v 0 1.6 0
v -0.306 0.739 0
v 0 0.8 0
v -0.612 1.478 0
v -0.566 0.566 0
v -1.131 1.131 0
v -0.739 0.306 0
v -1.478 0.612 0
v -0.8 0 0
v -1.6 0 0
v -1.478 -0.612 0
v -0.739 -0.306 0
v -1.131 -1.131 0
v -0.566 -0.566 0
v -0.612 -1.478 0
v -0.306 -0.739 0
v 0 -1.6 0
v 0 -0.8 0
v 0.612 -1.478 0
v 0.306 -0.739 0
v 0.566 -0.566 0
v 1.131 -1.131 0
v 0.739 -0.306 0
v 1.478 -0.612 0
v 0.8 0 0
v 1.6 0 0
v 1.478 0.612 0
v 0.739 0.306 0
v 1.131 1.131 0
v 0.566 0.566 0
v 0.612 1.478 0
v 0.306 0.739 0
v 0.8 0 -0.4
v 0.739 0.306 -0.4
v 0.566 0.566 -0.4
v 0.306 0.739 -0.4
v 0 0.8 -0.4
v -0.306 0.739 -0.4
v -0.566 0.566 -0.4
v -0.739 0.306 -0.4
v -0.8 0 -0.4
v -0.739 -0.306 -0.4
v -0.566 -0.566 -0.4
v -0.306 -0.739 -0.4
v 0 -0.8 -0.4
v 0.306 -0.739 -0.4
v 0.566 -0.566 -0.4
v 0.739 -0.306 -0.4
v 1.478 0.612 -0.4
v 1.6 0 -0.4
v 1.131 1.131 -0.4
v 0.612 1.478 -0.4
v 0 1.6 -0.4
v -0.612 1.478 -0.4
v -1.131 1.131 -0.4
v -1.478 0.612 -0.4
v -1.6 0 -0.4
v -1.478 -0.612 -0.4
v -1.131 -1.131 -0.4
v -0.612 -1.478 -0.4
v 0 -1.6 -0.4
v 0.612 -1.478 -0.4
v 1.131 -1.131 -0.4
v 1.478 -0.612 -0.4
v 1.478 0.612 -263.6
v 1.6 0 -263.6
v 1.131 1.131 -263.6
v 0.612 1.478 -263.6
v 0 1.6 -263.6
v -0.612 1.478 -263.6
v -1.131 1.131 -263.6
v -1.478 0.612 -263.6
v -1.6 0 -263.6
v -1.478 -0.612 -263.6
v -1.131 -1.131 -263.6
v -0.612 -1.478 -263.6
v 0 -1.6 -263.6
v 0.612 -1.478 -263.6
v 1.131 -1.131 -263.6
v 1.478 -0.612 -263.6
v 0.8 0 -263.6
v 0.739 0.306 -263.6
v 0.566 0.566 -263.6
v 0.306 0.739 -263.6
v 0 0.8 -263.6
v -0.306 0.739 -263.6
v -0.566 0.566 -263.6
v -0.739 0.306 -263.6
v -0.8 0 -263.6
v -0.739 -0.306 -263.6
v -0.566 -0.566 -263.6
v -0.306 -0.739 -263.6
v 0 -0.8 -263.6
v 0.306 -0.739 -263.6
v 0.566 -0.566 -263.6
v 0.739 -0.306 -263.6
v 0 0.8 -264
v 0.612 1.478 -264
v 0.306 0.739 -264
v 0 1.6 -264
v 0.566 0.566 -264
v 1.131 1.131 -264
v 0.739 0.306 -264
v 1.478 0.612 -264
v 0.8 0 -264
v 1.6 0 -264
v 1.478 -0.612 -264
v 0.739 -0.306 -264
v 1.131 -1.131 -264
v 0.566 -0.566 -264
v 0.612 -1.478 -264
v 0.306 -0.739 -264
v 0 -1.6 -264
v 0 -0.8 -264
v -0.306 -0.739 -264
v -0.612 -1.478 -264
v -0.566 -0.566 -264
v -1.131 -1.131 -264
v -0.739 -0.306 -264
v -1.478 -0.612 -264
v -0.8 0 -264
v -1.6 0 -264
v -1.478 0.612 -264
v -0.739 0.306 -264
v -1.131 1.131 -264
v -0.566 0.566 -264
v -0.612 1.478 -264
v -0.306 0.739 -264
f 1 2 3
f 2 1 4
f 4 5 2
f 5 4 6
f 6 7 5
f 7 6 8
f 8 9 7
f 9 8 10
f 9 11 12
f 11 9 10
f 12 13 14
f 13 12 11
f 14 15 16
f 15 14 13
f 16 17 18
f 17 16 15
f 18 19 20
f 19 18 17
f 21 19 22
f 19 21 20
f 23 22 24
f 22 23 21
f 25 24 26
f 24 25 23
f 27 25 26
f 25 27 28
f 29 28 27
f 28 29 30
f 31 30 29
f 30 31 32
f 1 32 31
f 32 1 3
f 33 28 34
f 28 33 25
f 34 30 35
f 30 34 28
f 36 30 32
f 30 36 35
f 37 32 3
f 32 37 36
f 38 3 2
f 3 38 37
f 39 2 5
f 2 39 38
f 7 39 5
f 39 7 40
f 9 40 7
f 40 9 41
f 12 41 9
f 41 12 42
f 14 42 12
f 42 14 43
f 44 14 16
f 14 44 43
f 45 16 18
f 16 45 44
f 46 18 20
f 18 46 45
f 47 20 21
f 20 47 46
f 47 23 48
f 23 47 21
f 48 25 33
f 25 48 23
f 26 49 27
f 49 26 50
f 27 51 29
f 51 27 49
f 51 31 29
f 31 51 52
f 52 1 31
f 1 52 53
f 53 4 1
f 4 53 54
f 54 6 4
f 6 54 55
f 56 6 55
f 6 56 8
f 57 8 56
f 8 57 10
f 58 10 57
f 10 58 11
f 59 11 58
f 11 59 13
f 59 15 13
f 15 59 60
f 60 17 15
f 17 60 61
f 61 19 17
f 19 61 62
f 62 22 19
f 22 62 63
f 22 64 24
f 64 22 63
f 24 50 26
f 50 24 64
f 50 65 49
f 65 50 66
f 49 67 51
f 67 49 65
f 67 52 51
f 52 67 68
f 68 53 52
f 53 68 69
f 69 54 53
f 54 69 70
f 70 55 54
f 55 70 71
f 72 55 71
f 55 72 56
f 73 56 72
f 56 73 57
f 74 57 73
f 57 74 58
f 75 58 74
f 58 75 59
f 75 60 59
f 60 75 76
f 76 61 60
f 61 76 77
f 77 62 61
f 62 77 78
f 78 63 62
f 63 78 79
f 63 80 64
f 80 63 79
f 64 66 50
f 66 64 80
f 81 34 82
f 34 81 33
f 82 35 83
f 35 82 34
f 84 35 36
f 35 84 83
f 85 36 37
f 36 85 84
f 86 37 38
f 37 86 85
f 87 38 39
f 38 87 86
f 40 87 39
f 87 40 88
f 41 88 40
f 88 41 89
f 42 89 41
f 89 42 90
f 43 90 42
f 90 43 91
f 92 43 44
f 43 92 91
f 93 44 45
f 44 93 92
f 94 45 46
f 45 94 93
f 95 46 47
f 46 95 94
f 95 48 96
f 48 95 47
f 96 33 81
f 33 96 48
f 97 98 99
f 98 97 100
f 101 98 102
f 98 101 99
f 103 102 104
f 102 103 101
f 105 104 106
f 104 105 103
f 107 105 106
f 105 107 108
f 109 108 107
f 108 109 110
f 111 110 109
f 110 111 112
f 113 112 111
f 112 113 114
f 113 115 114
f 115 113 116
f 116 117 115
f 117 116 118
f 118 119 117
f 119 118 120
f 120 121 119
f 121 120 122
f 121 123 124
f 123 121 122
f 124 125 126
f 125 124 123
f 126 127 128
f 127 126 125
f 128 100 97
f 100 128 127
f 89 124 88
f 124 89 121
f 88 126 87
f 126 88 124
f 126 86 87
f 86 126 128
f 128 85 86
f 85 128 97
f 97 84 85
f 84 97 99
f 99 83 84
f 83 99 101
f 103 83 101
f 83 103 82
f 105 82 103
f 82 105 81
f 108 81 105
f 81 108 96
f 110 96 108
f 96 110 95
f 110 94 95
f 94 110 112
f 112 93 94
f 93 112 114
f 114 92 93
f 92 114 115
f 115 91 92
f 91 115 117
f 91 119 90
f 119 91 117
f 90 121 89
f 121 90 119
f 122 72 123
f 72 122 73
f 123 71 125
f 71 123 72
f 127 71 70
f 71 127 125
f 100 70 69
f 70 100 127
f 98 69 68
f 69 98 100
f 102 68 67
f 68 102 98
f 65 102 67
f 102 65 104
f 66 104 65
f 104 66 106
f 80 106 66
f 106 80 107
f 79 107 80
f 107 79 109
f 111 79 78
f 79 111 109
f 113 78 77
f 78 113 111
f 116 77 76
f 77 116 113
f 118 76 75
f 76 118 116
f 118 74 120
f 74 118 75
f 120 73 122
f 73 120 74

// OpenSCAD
// file: ../p/4-4ring1.scad
use <../lib.scad>
function ldraw_lib__4_4ring1() = [
// 0 Ring  1 x 1.0
// 0 Name: 4-4ring1.dat
// 0 Author: James Jessiman
// 0 !LDRAW_ORG Primitive UPDATE 2009-01
// 0 !LICENSE Licensed under CC BY 2.0 and CC BY 4.0 : see CAreadme.txt
// 
// 0 BFC CERTIFY CCW
  [0,"BFC","CERTIFY"],
  [0,"BFC","CCW"],
// 
// 0 !HISTORY 1998-12-15 [PTadmin] Official Update 1998-10
// 0 !HISTORY 2002-04-08 [BrickCaster] Modified for BFC compliance
// 0 !HISTORY 2002-04-25 [PTadmin] Official Update 2002-02
// 0 !HISTORY 2007-06-24 [PTadmin] Header formatted for Contributor Agreement
// 0 !HISTORY 2008-07-01 [PTadmin] Official Update 2008-01
// 0 !HISTORY 2008-08-26 [cwdee] Switch polygon winding and rename
// 0 !HISTORY 2009-05-02 [PTadmin] Official Update 2009-01
// 
// 
// 4 16 -0.7654 0 1.8478 -0.3827 0 0.9239 0 0 1 0 0 2
  [4,16,-0.7654,0,1.8478,-0.3827,0,0.9239,0,0,1,0,0,2],
// 4 16 -1.4142 0 1.4142 -0.7071 0 0.7071 -0.3827 0 0.9239 -0.7654 0 1.8478
  [4,16,-1.4142,0,1.4142,-0.7071,0,0.7071,-0.3827,0,0.9239,-0.7654,0,1.8478],
// 4 16 -1.8478 0 0.7654 -0.9239 0 0.3827 -0.7071 0 0.7071 -1.4142 0 1.41420
  [4,16,-1.8478,0,0.7654,-0.9239,0,0.3827,-0.7071,0,0.7071,-1.4142,0,1.41420],
// 4 16 -2 0 0 -1 0 0 -0.9239 0 0.3827 -1.8478 0 0.7654
  [4,16,-2,0,0,-1,0,0,-0.9239,0,0.3827,-1.8478,0,0.7654],
// 4 16 -1.8478 0 -0.7654 -0.9239 0 -0.3827 -1 0 0 -2 0 0
  [4,16,-1.8478,0,-0.7654,-0.9239,0,-0.3827,-1,0,0,-2,0,0],
// 4 16 -1.4142 0 -1.4142 -0.7071 0 -0.7071 -0.9239 0 -0.3827 -1.8478 0 -0.7654
  [4,16,-1.4142,0,-1.4142,-0.7071,0,-0.7071,-0.9239,0,-0.3827,-1.8478,0,-0.7654],
// 4 16 -0.7654 0 -1.8478 -0.3827 0 -0.9239 -0.7071 0 -0.7071 -1.4142 0 -1.4142
  [4,16,-0.7654,0,-1.8478,-0.3827,0,-0.9239,-0.7071,0,-0.7071,-1.4142,0,-1.4142],
// 4 16 0 0 -2 0 0 -1 -0.3827 0 -0.9239 -0.7654 0 -1.8478
  [4,16,0,0,-2,0,0,-1,-0.3827,0,-0.9239,-0.7654,0,-1.8478],
// 4 16 0.7654 0 -1.8478 0.3827 0 -0.9239 0 0 -1 0 0 -2
  [4,16,0.7654,0,-1.8478,0.3827,0,-0.9239,0,0,-1,0,0,-2],
// 4 16 1.4142 0 -1.4142 0.7071 0 -0.7071 0.3827 0 -0.9239 0.7654 0 -1.8478
  [4,16,1.4142,0,-1.4142,0.7071,0,-0.7071,0.3827,0,-0.9239,0.7654,0,-1.8478],
// 4 16 1.8478 0 -0.7654 0.9239 0 -0.3827 0.7071 0 -0.7071 1.4142 0 -1.4142
  [4,16,1.8478,0,-0.7654,0.9239,0,-0.3827,0.7071,0,-0.7071,1.4142,0,-1.4142],
// 4 16 2 0 0 1 0 0 0.9239 0 -0.3827 1.8478 0 -0.7654
  [4,16,2,0,0,1,0,0,0.9239,0,-0.3827,1.8478,0,-0.7654],
// 4 16 1.8478 0 0.7654 0.9239 0 0.3827 1 0 0 2 0 0
  [4,16,1.8478,0,0.7654,0.9239,0,0.3827,1,0,0,2,0,0],
// 4 16 1.4142 0 1.4142 0.7071 0 0.7071 0.9239 0 0.3827 1.8478 0 0.7654
  [4,16,1.4142,0,1.4142,0.7071,0,0.7071,0.9239,0,0.3827,1.8478,0,0.7654],
// 4 16 0.7654 0 1.8478 0.3827 0 0.9239 0.7071 0 0.7071 1.4142 0 1.4142
  [4,16,0.7654,0,1.8478,0.3827,0,0.9239,0.7071,0,0.7071,1.4142,0,1.4142],
// 4 16 0 0 2 0 0 1 0.3827 0 0.9239 0.7654 0 1.8478
  [4,16,0,0,2,0,0,1,0.3827,0,0.9239,0.7654,0,1.8478],
// 0
];
module ldraw_lib__4_4ring1(step=0, col=false, unit=2/5, alt=false, line=0.2, solid=!$preview)
    makepoly(ldraw_lib__4_4ring1(), step=step, col=col, unit=unit, alt=alt, line=line, solid=solid);
ldraw_lib__4_4ring1(line=0.2);
// file: ../p/4-4edge.scad
use <../lib.scad>
function ldraw_lib__4_4edge() = [
// 0 Circle 1.0
// 0 Name: 4-4edge.dat
// 0 Author: James Jessiman
// 0 !LDRAW_ORG Primitive UPDATE 2017-01
// 0 !LICENSE Licensed under CC BY 2.0 and CC BY 4.0 : see CAreadme.txt
// 
// 0 BFC CERTIFY CCW
  [0,"BFC","CERTIFY"],
  [0,"BFC","CCW"],
// 
// 0 !HISTORY 1998-12-15 [PTadmin] Official Update 1998-10
// 0 !HISTORY 2005-12-28 [PTadmin] Official Update 2005-01
// 0 !HISTORY 2007-06-24 [PTadmin] Header formatted for Contributor Agreement
// 0 !HISTORY 2008-07-01 [PTadmin] Official Update 2008-01
// 0 !HISTORY 2017-01-15 [Steffen] BFCed
// 0 !HISTORY 2017-12-30 [PTadmin] Official Update 2017-01
// 
// 
// 2 24 1 0 0 0.9239 0 0.3827
  [2,24,1,0,0,0.9239,0,0.3827],
// 2 24 0.9239 0 0.3827 0.7071 0 0.7071
  [2,24,0.9239,0,0.3827,0.7071,0,0.7071],
// 2 24 0.7071 0 0.7071 0.3827 0 0.9239
  [2,24,0.7071,0,0.7071,0.3827,0,0.9239],
// 2 24 0.3827 0 0.9239 0 0 1
  [2,24,0.3827,0,0.9239,0,0,1],
// 2 24 0 0 1 -0.3827 0 0.9239
  [2,24,0,0,1,-0.3827,0,0.9239],
// 2 24 -0.3827 0 0.9239 -0.7071 0 0.7071
  [2,24,-0.3827,0,0.9239,-0.7071,0,0.7071],
// 2 24 -0.7071 0 0.7071 -0.9239 0 0.3827
  [2,24,-0.7071,0,0.7071,-0.9239,0,0.3827],
// 2 24 -0.9239 0 0.3827 -1 0 -0
  [2,24,-0.9239,0,0.3827,-1,0,-0],
// 2 24 -1 0 -0 -0.9239 0 -0.3827
  [2,24,-1,0,-0,-0.9239,0,-0.3827],
// 2 24 -0.9239 0 -0.3827 -0.7071 0 -0.7071
  [2,24,-0.9239,0,-0.3827,-0.7071,0,-0.7071],
// 2 24 -0.7071 0 -0.7071 -0.3827 0 -0.9239
  [2,24,-0.7071,0,-0.7071,-0.3827,0,-0.9239],
// 2 24 -0.3827 0 -0.9239 0 0 -1
  [2,24,-0.3827,0,-0.9239,0,0,-1],
// 2 24 0 0 -1 0.3827 0 -0.9239
  [2,24,0,0,-1,0.3827,0,-0.9239],
// 2 24 0.3827 0 -0.9239 0.7071 0 -0.7071
  [2,24,0.3827,0,-0.9239,0.7071,0,-0.7071],
// 2 24 0.7071 0 -0.7071 0.9239 0 -0.3827
  [2,24,0.7071,0,-0.7071,0.9239,0,-0.3827],
// 2 24 0.9239 0 -0.3827 1 0 0
  [2,24,0.9239,0,-0.3827,1,0,0],
];
module ldraw_lib__4_4edge(step=0, col=false, unit=2/5, alt=false, line=0.2, solid=!$preview)
    makepoly(ldraw_lib__4_4edge(), step=step, col=col, unit=unit, alt=alt, line=line, solid=solid);
ldraw_lib__4_4edge(line=0.2);
// file: ../p/4-4cyli.scad
use <../lib.scad>
function ldraw_lib__4_4cyli() = [
// 0 Cylinder 1.0
// 0 Name: 4-4cyli.dat
// 0 Author: James Jessiman
// 0 !LDRAW_ORG Primitive UPDATE 2005-01
// 0 !LICENSE Licensed under CC BY 2.0 and CC BY 4.0 : see CAreadme.txt
// 
// 0 BFC CERTIFY CCW
  [0,"BFC","CERTIFY"],
  [0,"BFC","CCW"],
// 
// 0 !HISTORY 1998-12-15 [PTadmin] Official Update 1998-10
// 0 !HISTORY 2002-03-23 [sbliss] Added BFC statement; merged headers from files in distributions LDraw 0.27 and Complete.
// 0 !HISTORY 2002-04-25 [PTadmin] Official Update 2002-02
// 0 !HISTORY 2004-12-14 [guyvivan] BFC CCW
// 0 !HISTORY 2005-12-28 [PTadmin] Official Update 2005-01
// 0 !HISTORY 2007-06-24 [PTadmin] Header formatted for Contributor Agreement
// 0 !HISTORY 2008-07-01 [PTadmin] Official Update 2008-01
// 
// 
// 4 16 1 1 0 0.9239 1 0.3827 0.9239 0 0.3827 1 0 0
  [4,16,1,1,0,0.9239,1,0.3827,0.9239,0,0.3827,1,0,0],
// 5 24 1 0 0 1 1 0 0.9239 0 0.3827 0.9239 0 -0.3827
  [5,24,1,0,0,1,1,0,0.9239,0,0.3827,0.9239,0,-0.3827],
// 4 16 0.9239 1 0.3827 0.7071 1 0.7071 0.7071 0 0.7071 0.9239 0 0.3827
  [4,16,0.9239,1,0.3827,0.7071,1,0.7071,0.7071,0,0.7071,0.9239,0,0.3827],
// 5 24 0.9239 0 0.3827 0.9239 1 0.3827 0.7071 0 0.7071 1 0 0
  [5,24,0.9239,0,0.3827,0.9239,1,0.3827,0.7071,0,0.7071,1,0,0],
// 4 16 0.7071 1 0.7071 0.3827 1 0.9239 0.3827 0 0.9239 0.7071 0 0.7071
  [4,16,0.7071,1,0.7071,0.3827,1,0.9239,0.3827,0,0.9239,0.7071,0,0.7071],
// 5 24 0.7071 0 0.7071 0.7071 1 0.7071 0.3827 0 0.9239 0.9239 0 0.3827
  [5,24,0.7071,0,0.7071,0.7071,1,0.7071,0.3827,0,0.9239,0.9239,0,0.3827],
// 4 16 0.3827 1 0.9239 0 1 1 0 0 1 0.3827 0 0.9239
  [4,16,0.3827,1,0.9239,0,1,1,0,0,1,0.3827,0,0.9239],
// 5 24 0.3827 0 0.9239 0.3827 1 0.9239 0 0 1 0.7071 0 0.7071
  [5,24,0.3827,0,0.9239,0.3827,1,0.9239,0,0,1,0.7071,0,0.7071],
// 4 16 0 1 1 -0.3827 1 0.9239 -0.3827 0 0.9239 0 0 1
  [4,16,0,1,1,-0.3827,1,0.9239,-0.3827,0,0.9239,0,0,1],
// 5 24 0 0 1 0 1 1 -0.3827 0 0.9239 0.3827 0 0.9239
  [5,24,0,0,1,0,1,1,-0.3827,0,0.9239,0.3827,0,0.9239],
// 4 16 -0.3827 1 0.9239 -0.7071 1 0.7071 -0.7071 0 0.7071 -0.3827 0 0.9239
  [4,16,-0.3827,1,0.9239,-0.7071,1,0.7071,-0.7071,0,0.7071,-0.3827,0,0.9239],
// 5 24 -0.3827 0 0.9239 -0.3827 1 0.9239 -0.7071 0 0.7071 0 0 1
  [5,24,-0.3827,0,0.9239,-0.3827,1,0.9239,-0.7071,0,0.7071,0,0,1],
// 4 16 -0.7071 1 0.7071 -0.9239 1 0.3827 -0.9239 0 0.3827 -0.7071 0 0.7071
  [4,16,-0.7071,1,0.7071,-0.9239,1,0.3827,-0.9239,0,0.3827,-0.7071,0,0.7071],
// 5 24 -0.7071 0 0.7071 -0.7071 1 0.7071 -0.9239 0 0.3827 -0.3827 0 0.9239
  [5,24,-0.7071,0,0.7071,-0.7071,1,0.7071,-0.9239,0,0.3827,-0.3827,0,0.9239],
// 4 16 -0.9239 1 0.3827 -1 1 0 -1 0 0 -0.9239 0 0.3827
  [4,16,-0.9239,1,0.3827,-1,1,0,-1,0,0,-0.9239,0,0.3827],
// 5 24 -0.9239 0 0.3827 -0.9239 1 0.3827 -1 0 0 -0.7071 0 0.7071
  [5,24,-0.9239,0,0.3827,-0.9239,1,0.3827,-1,0,0,-0.7071,0,0.7071],
// 4 16 -1 1 0 -0.9239 1 -0.3827 -0.9239 0 -0.3827 -1 0 0
  [4,16,-1,1,0,-0.9239,1,-0.3827,-0.9239,0,-0.3827,-1,0,0],
// 5 24 -1 0 0 -1 1 0 -0.9239 0 -0.3827 -0.9239 0 0.3827
  [5,24,-1,0,0,-1,1,0,-0.9239,0,-0.3827,-0.9239,0,0.3827],
// 4 16 -0.9239 1 -0.3827 -0.7071 1 -0.7071 -0.7071 0 -0.7071 -0.9239 0 -0.3827
  [4,16,-0.9239,1,-0.3827,-0.7071,1,-0.7071,-0.7071,0,-0.7071,-0.9239,0,-0.3827],
// 5 24 -0.9239 0 -0.3827 -0.9239 1 -0.3827 -0.7071 0 -0.7071 -1 0 0
  [5,24,-0.9239,0,-0.3827,-0.9239,1,-0.3827,-0.7071,0,-0.7071,-1,0,0],
// 4 16 -0.7071 1 -0.7071 -0.3827 1 -0.9239 -0.3827 0 -0.9239 -0.7071 0 -0.7071
  [4,16,-0.7071,1,-0.7071,-0.3827,1,-0.9239,-0.3827,0,-0.9239,-0.7071,0,-0.7071],
// 5 24 -0.7071 0 -0.7071 -0.7071 1 -0.7071 -0.3827 0 -0.9239 -0.9239 0 -0.3827
  [5,24,-0.7071,0,-0.7071,-0.7071,1,-0.7071,-0.3827,0,-0.9239,-0.9239,0,-0.3827],
// 4 16 -0.3827 1 -0.9239 0 1 -1 0 0 -1 -0.3827 0 -0.9239
  [4,16,-0.3827,1,-0.9239,0,1,-1,0,0,-1,-0.3827,0,-0.9239],
// 5 24 -0.3827 0 -0.9239 -0.3827 1 -0.9239 0 0 -1 -0.7071 0 -0.7071
  [5,24,-0.3827,0,-0.9239,-0.3827,1,-0.9239,0,0,-1,-0.7071,0,-0.7071],
// 4 16 0 1 -1 0.3827 1 -0.9239 0.3827 0 -0.9239 0 0 -1
  [4,16,0,1,-1,0.3827,1,-0.9239,0.3827,0,-0.9239,0,0,-1],
// 5 24 0 0 -1 0 1 -1 0.3827 0 -0.9239 -0.3827 0 -0.9239
  [5,24,0,0,-1,0,1,-1,0.3827,0,-0.9239,-0.3827,0,-0.9239],
// 4 16 0.3827 1 -0.9239 0.7071 1 -0.7071 0.7071 0 -0.7071 0.3827 0 -0.9239
  [4,16,0.3827,1,-0.9239,0.7071,1,-0.7071,0.7071,0,-0.7071,0.3827,0,-0.9239],
// 5 24 0.3827 0 -0.9239 0.3827 1 -0.9239 0.7071 0 -0.7071 0 0 -1
  [5,24,0.3827,0,-0.9239,0.3827,1,-0.9239,0.7071,0,-0.7071,0,0,-1],
// 4 16 0.7071 1 -0.7071 0.9239 1 -0.3827 0.9239 0 -0.3827 0.7071 0 -0.7071
  [4,16,0.7071,1,-0.7071,0.9239,1,-0.3827,0.9239,0,-0.3827,0.7071,0,-0.7071],
// 5 24 0.7071 0 -0.7071 0.7071 1 -0.7071 0.9239 0 -0.3827 0.3827 0 -0.9239
  [5,24,0.7071,0,-0.7071,0.7071,1,-0.7071,0.9239,0,-0.3827,0.3827,0,-0.9239],
// 4 16 0.9239 1 -0.3827 1 1 0 1 0 0 0.9239 0 -0.3827
  [4,16,0.9239,1,-0.3827,1,1,0,1,0,0,0.9239,0,-0.3827],
// 5 24 0.9239 0 -0.3827 0.9239 1 -0.3827 1 0 0 0.7071 0 -0.7071
  [5,24,0.9239,0,-0.3827,0.9239,1,-0.3827,1,0,0,0.7071,0,-0.7071],
// 0
];
module ldraw_lib__4_4cyli(step=0, col=false, unit=2/5, alt=false, line=0.2, solid=!$preview)
    makepoly(ldraw_lib__4_4cyli(), step=step, col=col, unit=unit, alt=alt, line=line, solid=solid);
ldraw_lib__4_4cyli(line=0.2);
// file: u9053.scad
use <../lib.scad>
use <../p/4-4cyli.scad>
use <../p/4-4edge.scad>
use <../p/4-4ring1.scad>
function ldraw_lib__u9053() = [
// 0 ~Technic Flex-System Hose End
// 0 Name: u9053.dat
// 0 Author: William Howard [WilliamH]
// 0 !LDRAW_ORG Part UPDATE 2011-02
// 0 !LICENSE Licensed under CC BY 2.0 and CC BY 4.0 : see CAreadme.txt
// 
// 0 BFC CERTIFY CCW
  [0,"BFC","CERTIFY"],
  [0,"BFC","CCW"],
// 
// 0 !HISTORY 2011-12-21 [cwdee] Reworked subparting technique
// 0 !HISTORY 2011-12-23 [PTadmin] Renamed from 76
// 0 !HISTORY 2011-12-29 [PTadmin] Official Update 2011-02
// 
// 
// 1 16 0 0 0 2 0 0 0 1 0 0 0 2 4-4ring1.dat
  [1,16,0,0,0,2,0,0,0,1,0,0,0,2, ldraw_lib__4_4ring1()],
// 1 16 0 0 0 2 0 0 0 1 0 0 0 2 4-4edge.dat
  [1,16,0,0,0,2,0,0,0,1,0,0,0,2, ldraw_lib__4_4edge()],
// 0 BFC INVERTNEXT
  [0,"BFC","INVERTNEXT"],
// 1 16 0 0 0 2 0 0 0 1 0 0 0 2 4-4cyli.dat
  [1,16,0,0,0,2,0,0,0,1,0,0,0,2, ldraw_lib__4_4cyli()],
// 1 16 0 0 0 4 0 0 0 1 0 0 0 4 4-4edge.dat
  [1,16,0,0,0,4,0,0,0,1,0,0,0,4, ldraw_lib__4_4edge()],
// 1 16 0 0 0 4 0 0 0 1 0 0 0 4 4-4cyli.dat
  [1,16,0,0,0,4,0,0,0,1,0,0,0,4, ldraw_lib__4_4cyli()],
// 0
];
module ldraw_lib__u9053(step=0, col=false, unit=2/5, alt=false, line=0.2, solid=!$preview)
    makepoly(ldraw_lib__u9053(), step=step, col=col, unit=unit, alt=alt, line=line, solid=solid);
ldraw_lib__u9053(line=0.2);
// file: 77.scad
use <../lib.scad>
use <../p/4-4cyli.scad>
function ldraw_lib__77() = [
// 0 ~Technic Flex-System Hose Segment
// 0 Name: 77.dat
// 0 Author: William Howard [WilliamH]
// 0 !LDRAW_ORG Part UPDATE 2011-02
// 0 !LICENSE Licensed under CC BY 2.0 and CC BY 4.0 : see CAreadme.txt
// 
// 0 BFC CERTIFY CCW
  [0,"BFC","CERTIFY"],
  [0,"BFC","CCW"],
// 
// 0 !HISTORY 2011-12-21 [cwdee] Reworked subparting technique
// 0 !HISTORY 2011-12-29 [PTadmin] Official Update 2011-02
// 
// 
// 1 16 0 0 0 4 0 0 0 1 0 0 0 4 4-4cyli.dat
  [1,16,0,0,0,4,0,0,0,1,0,0,0,4, ldraw_lib__4_4cyli()],
// 0 BFC INVERTNEXT
  [0,"BFC","INVERTNEXT"],
// 1 16 0 0 0 2 0 0 0 1 0 0 0 2 4-4cyli.dat
  [1,16,0,0,0,2,0,0,0,1,0,0,0,2, ldraw_lib__4_4cyli()],
// 0
];
module ldraw_lib__77(step=0, col=false, unit=2/5, alt=false, line=0.2, solid=!$preview)
    makepoly(ldraw_lib__77(), step=step, col=col, unit=unit, alt=alt, line=line, solid=solid);
ldraw_lib__77(line=0.2);
// main file
use <../lib.scad>
use <77.scad>
use <u9053.scad>
function ldraw_lib__42688() = [
// 0 Technic Flex-System Hose 33L (660LDU)
// 0 Name: 42688.dat
// 0 Author: Tim Gould [timgould]
// 0 !LDRAW_ORG Part UPDATE 2011-02
// 0 !LICENSE Licensed under CC BY 2.0 and CC BY 4.0 : see CAreadme.txt
// 
// 0 BFC CERTIFY CCW
  [0,"BFC","CERTIFY"],
  [0,"BFC","CCW"],
// 
// 0 !KEYWORDS bar, tube
// 
// 0 !HISTORY 2011-12-29 [PTadmin] Official Update 2011-02
// 
// 
// 1 16 0 0 0 1 0 0 0 1 0 0 0 1 u9053.dat
  [1,16,0,0,0,1,0,0,0,1,0,0,0,1, ldraw_lib__u9053()],
// 1 16 0 1 0 1 0 0 0 658 0 0 0 1 77.dat
  [1,16,0,1,0,1,0,0,0,658,0,0,0,1, ldraw_lib__77()],
// 1 16 0 660 0 -1 0 0 0 -1 0 0 0 1 u9053.dat
  [1,16,0,660,0,-1,0,0,0,-1,0,0,0,1, ldraw_lib__u9053()],
];
module ldraw_lib__42688(step=0, col=false, unit=2/5, alt=false, line=0.2, solid=!$preview)
    makepoly(ldraw_lib__42688(), step=step, col=col, unit=unit, alt=alt, line=line, solid=solid);
ldraw_lib__42688(line=0.2);
